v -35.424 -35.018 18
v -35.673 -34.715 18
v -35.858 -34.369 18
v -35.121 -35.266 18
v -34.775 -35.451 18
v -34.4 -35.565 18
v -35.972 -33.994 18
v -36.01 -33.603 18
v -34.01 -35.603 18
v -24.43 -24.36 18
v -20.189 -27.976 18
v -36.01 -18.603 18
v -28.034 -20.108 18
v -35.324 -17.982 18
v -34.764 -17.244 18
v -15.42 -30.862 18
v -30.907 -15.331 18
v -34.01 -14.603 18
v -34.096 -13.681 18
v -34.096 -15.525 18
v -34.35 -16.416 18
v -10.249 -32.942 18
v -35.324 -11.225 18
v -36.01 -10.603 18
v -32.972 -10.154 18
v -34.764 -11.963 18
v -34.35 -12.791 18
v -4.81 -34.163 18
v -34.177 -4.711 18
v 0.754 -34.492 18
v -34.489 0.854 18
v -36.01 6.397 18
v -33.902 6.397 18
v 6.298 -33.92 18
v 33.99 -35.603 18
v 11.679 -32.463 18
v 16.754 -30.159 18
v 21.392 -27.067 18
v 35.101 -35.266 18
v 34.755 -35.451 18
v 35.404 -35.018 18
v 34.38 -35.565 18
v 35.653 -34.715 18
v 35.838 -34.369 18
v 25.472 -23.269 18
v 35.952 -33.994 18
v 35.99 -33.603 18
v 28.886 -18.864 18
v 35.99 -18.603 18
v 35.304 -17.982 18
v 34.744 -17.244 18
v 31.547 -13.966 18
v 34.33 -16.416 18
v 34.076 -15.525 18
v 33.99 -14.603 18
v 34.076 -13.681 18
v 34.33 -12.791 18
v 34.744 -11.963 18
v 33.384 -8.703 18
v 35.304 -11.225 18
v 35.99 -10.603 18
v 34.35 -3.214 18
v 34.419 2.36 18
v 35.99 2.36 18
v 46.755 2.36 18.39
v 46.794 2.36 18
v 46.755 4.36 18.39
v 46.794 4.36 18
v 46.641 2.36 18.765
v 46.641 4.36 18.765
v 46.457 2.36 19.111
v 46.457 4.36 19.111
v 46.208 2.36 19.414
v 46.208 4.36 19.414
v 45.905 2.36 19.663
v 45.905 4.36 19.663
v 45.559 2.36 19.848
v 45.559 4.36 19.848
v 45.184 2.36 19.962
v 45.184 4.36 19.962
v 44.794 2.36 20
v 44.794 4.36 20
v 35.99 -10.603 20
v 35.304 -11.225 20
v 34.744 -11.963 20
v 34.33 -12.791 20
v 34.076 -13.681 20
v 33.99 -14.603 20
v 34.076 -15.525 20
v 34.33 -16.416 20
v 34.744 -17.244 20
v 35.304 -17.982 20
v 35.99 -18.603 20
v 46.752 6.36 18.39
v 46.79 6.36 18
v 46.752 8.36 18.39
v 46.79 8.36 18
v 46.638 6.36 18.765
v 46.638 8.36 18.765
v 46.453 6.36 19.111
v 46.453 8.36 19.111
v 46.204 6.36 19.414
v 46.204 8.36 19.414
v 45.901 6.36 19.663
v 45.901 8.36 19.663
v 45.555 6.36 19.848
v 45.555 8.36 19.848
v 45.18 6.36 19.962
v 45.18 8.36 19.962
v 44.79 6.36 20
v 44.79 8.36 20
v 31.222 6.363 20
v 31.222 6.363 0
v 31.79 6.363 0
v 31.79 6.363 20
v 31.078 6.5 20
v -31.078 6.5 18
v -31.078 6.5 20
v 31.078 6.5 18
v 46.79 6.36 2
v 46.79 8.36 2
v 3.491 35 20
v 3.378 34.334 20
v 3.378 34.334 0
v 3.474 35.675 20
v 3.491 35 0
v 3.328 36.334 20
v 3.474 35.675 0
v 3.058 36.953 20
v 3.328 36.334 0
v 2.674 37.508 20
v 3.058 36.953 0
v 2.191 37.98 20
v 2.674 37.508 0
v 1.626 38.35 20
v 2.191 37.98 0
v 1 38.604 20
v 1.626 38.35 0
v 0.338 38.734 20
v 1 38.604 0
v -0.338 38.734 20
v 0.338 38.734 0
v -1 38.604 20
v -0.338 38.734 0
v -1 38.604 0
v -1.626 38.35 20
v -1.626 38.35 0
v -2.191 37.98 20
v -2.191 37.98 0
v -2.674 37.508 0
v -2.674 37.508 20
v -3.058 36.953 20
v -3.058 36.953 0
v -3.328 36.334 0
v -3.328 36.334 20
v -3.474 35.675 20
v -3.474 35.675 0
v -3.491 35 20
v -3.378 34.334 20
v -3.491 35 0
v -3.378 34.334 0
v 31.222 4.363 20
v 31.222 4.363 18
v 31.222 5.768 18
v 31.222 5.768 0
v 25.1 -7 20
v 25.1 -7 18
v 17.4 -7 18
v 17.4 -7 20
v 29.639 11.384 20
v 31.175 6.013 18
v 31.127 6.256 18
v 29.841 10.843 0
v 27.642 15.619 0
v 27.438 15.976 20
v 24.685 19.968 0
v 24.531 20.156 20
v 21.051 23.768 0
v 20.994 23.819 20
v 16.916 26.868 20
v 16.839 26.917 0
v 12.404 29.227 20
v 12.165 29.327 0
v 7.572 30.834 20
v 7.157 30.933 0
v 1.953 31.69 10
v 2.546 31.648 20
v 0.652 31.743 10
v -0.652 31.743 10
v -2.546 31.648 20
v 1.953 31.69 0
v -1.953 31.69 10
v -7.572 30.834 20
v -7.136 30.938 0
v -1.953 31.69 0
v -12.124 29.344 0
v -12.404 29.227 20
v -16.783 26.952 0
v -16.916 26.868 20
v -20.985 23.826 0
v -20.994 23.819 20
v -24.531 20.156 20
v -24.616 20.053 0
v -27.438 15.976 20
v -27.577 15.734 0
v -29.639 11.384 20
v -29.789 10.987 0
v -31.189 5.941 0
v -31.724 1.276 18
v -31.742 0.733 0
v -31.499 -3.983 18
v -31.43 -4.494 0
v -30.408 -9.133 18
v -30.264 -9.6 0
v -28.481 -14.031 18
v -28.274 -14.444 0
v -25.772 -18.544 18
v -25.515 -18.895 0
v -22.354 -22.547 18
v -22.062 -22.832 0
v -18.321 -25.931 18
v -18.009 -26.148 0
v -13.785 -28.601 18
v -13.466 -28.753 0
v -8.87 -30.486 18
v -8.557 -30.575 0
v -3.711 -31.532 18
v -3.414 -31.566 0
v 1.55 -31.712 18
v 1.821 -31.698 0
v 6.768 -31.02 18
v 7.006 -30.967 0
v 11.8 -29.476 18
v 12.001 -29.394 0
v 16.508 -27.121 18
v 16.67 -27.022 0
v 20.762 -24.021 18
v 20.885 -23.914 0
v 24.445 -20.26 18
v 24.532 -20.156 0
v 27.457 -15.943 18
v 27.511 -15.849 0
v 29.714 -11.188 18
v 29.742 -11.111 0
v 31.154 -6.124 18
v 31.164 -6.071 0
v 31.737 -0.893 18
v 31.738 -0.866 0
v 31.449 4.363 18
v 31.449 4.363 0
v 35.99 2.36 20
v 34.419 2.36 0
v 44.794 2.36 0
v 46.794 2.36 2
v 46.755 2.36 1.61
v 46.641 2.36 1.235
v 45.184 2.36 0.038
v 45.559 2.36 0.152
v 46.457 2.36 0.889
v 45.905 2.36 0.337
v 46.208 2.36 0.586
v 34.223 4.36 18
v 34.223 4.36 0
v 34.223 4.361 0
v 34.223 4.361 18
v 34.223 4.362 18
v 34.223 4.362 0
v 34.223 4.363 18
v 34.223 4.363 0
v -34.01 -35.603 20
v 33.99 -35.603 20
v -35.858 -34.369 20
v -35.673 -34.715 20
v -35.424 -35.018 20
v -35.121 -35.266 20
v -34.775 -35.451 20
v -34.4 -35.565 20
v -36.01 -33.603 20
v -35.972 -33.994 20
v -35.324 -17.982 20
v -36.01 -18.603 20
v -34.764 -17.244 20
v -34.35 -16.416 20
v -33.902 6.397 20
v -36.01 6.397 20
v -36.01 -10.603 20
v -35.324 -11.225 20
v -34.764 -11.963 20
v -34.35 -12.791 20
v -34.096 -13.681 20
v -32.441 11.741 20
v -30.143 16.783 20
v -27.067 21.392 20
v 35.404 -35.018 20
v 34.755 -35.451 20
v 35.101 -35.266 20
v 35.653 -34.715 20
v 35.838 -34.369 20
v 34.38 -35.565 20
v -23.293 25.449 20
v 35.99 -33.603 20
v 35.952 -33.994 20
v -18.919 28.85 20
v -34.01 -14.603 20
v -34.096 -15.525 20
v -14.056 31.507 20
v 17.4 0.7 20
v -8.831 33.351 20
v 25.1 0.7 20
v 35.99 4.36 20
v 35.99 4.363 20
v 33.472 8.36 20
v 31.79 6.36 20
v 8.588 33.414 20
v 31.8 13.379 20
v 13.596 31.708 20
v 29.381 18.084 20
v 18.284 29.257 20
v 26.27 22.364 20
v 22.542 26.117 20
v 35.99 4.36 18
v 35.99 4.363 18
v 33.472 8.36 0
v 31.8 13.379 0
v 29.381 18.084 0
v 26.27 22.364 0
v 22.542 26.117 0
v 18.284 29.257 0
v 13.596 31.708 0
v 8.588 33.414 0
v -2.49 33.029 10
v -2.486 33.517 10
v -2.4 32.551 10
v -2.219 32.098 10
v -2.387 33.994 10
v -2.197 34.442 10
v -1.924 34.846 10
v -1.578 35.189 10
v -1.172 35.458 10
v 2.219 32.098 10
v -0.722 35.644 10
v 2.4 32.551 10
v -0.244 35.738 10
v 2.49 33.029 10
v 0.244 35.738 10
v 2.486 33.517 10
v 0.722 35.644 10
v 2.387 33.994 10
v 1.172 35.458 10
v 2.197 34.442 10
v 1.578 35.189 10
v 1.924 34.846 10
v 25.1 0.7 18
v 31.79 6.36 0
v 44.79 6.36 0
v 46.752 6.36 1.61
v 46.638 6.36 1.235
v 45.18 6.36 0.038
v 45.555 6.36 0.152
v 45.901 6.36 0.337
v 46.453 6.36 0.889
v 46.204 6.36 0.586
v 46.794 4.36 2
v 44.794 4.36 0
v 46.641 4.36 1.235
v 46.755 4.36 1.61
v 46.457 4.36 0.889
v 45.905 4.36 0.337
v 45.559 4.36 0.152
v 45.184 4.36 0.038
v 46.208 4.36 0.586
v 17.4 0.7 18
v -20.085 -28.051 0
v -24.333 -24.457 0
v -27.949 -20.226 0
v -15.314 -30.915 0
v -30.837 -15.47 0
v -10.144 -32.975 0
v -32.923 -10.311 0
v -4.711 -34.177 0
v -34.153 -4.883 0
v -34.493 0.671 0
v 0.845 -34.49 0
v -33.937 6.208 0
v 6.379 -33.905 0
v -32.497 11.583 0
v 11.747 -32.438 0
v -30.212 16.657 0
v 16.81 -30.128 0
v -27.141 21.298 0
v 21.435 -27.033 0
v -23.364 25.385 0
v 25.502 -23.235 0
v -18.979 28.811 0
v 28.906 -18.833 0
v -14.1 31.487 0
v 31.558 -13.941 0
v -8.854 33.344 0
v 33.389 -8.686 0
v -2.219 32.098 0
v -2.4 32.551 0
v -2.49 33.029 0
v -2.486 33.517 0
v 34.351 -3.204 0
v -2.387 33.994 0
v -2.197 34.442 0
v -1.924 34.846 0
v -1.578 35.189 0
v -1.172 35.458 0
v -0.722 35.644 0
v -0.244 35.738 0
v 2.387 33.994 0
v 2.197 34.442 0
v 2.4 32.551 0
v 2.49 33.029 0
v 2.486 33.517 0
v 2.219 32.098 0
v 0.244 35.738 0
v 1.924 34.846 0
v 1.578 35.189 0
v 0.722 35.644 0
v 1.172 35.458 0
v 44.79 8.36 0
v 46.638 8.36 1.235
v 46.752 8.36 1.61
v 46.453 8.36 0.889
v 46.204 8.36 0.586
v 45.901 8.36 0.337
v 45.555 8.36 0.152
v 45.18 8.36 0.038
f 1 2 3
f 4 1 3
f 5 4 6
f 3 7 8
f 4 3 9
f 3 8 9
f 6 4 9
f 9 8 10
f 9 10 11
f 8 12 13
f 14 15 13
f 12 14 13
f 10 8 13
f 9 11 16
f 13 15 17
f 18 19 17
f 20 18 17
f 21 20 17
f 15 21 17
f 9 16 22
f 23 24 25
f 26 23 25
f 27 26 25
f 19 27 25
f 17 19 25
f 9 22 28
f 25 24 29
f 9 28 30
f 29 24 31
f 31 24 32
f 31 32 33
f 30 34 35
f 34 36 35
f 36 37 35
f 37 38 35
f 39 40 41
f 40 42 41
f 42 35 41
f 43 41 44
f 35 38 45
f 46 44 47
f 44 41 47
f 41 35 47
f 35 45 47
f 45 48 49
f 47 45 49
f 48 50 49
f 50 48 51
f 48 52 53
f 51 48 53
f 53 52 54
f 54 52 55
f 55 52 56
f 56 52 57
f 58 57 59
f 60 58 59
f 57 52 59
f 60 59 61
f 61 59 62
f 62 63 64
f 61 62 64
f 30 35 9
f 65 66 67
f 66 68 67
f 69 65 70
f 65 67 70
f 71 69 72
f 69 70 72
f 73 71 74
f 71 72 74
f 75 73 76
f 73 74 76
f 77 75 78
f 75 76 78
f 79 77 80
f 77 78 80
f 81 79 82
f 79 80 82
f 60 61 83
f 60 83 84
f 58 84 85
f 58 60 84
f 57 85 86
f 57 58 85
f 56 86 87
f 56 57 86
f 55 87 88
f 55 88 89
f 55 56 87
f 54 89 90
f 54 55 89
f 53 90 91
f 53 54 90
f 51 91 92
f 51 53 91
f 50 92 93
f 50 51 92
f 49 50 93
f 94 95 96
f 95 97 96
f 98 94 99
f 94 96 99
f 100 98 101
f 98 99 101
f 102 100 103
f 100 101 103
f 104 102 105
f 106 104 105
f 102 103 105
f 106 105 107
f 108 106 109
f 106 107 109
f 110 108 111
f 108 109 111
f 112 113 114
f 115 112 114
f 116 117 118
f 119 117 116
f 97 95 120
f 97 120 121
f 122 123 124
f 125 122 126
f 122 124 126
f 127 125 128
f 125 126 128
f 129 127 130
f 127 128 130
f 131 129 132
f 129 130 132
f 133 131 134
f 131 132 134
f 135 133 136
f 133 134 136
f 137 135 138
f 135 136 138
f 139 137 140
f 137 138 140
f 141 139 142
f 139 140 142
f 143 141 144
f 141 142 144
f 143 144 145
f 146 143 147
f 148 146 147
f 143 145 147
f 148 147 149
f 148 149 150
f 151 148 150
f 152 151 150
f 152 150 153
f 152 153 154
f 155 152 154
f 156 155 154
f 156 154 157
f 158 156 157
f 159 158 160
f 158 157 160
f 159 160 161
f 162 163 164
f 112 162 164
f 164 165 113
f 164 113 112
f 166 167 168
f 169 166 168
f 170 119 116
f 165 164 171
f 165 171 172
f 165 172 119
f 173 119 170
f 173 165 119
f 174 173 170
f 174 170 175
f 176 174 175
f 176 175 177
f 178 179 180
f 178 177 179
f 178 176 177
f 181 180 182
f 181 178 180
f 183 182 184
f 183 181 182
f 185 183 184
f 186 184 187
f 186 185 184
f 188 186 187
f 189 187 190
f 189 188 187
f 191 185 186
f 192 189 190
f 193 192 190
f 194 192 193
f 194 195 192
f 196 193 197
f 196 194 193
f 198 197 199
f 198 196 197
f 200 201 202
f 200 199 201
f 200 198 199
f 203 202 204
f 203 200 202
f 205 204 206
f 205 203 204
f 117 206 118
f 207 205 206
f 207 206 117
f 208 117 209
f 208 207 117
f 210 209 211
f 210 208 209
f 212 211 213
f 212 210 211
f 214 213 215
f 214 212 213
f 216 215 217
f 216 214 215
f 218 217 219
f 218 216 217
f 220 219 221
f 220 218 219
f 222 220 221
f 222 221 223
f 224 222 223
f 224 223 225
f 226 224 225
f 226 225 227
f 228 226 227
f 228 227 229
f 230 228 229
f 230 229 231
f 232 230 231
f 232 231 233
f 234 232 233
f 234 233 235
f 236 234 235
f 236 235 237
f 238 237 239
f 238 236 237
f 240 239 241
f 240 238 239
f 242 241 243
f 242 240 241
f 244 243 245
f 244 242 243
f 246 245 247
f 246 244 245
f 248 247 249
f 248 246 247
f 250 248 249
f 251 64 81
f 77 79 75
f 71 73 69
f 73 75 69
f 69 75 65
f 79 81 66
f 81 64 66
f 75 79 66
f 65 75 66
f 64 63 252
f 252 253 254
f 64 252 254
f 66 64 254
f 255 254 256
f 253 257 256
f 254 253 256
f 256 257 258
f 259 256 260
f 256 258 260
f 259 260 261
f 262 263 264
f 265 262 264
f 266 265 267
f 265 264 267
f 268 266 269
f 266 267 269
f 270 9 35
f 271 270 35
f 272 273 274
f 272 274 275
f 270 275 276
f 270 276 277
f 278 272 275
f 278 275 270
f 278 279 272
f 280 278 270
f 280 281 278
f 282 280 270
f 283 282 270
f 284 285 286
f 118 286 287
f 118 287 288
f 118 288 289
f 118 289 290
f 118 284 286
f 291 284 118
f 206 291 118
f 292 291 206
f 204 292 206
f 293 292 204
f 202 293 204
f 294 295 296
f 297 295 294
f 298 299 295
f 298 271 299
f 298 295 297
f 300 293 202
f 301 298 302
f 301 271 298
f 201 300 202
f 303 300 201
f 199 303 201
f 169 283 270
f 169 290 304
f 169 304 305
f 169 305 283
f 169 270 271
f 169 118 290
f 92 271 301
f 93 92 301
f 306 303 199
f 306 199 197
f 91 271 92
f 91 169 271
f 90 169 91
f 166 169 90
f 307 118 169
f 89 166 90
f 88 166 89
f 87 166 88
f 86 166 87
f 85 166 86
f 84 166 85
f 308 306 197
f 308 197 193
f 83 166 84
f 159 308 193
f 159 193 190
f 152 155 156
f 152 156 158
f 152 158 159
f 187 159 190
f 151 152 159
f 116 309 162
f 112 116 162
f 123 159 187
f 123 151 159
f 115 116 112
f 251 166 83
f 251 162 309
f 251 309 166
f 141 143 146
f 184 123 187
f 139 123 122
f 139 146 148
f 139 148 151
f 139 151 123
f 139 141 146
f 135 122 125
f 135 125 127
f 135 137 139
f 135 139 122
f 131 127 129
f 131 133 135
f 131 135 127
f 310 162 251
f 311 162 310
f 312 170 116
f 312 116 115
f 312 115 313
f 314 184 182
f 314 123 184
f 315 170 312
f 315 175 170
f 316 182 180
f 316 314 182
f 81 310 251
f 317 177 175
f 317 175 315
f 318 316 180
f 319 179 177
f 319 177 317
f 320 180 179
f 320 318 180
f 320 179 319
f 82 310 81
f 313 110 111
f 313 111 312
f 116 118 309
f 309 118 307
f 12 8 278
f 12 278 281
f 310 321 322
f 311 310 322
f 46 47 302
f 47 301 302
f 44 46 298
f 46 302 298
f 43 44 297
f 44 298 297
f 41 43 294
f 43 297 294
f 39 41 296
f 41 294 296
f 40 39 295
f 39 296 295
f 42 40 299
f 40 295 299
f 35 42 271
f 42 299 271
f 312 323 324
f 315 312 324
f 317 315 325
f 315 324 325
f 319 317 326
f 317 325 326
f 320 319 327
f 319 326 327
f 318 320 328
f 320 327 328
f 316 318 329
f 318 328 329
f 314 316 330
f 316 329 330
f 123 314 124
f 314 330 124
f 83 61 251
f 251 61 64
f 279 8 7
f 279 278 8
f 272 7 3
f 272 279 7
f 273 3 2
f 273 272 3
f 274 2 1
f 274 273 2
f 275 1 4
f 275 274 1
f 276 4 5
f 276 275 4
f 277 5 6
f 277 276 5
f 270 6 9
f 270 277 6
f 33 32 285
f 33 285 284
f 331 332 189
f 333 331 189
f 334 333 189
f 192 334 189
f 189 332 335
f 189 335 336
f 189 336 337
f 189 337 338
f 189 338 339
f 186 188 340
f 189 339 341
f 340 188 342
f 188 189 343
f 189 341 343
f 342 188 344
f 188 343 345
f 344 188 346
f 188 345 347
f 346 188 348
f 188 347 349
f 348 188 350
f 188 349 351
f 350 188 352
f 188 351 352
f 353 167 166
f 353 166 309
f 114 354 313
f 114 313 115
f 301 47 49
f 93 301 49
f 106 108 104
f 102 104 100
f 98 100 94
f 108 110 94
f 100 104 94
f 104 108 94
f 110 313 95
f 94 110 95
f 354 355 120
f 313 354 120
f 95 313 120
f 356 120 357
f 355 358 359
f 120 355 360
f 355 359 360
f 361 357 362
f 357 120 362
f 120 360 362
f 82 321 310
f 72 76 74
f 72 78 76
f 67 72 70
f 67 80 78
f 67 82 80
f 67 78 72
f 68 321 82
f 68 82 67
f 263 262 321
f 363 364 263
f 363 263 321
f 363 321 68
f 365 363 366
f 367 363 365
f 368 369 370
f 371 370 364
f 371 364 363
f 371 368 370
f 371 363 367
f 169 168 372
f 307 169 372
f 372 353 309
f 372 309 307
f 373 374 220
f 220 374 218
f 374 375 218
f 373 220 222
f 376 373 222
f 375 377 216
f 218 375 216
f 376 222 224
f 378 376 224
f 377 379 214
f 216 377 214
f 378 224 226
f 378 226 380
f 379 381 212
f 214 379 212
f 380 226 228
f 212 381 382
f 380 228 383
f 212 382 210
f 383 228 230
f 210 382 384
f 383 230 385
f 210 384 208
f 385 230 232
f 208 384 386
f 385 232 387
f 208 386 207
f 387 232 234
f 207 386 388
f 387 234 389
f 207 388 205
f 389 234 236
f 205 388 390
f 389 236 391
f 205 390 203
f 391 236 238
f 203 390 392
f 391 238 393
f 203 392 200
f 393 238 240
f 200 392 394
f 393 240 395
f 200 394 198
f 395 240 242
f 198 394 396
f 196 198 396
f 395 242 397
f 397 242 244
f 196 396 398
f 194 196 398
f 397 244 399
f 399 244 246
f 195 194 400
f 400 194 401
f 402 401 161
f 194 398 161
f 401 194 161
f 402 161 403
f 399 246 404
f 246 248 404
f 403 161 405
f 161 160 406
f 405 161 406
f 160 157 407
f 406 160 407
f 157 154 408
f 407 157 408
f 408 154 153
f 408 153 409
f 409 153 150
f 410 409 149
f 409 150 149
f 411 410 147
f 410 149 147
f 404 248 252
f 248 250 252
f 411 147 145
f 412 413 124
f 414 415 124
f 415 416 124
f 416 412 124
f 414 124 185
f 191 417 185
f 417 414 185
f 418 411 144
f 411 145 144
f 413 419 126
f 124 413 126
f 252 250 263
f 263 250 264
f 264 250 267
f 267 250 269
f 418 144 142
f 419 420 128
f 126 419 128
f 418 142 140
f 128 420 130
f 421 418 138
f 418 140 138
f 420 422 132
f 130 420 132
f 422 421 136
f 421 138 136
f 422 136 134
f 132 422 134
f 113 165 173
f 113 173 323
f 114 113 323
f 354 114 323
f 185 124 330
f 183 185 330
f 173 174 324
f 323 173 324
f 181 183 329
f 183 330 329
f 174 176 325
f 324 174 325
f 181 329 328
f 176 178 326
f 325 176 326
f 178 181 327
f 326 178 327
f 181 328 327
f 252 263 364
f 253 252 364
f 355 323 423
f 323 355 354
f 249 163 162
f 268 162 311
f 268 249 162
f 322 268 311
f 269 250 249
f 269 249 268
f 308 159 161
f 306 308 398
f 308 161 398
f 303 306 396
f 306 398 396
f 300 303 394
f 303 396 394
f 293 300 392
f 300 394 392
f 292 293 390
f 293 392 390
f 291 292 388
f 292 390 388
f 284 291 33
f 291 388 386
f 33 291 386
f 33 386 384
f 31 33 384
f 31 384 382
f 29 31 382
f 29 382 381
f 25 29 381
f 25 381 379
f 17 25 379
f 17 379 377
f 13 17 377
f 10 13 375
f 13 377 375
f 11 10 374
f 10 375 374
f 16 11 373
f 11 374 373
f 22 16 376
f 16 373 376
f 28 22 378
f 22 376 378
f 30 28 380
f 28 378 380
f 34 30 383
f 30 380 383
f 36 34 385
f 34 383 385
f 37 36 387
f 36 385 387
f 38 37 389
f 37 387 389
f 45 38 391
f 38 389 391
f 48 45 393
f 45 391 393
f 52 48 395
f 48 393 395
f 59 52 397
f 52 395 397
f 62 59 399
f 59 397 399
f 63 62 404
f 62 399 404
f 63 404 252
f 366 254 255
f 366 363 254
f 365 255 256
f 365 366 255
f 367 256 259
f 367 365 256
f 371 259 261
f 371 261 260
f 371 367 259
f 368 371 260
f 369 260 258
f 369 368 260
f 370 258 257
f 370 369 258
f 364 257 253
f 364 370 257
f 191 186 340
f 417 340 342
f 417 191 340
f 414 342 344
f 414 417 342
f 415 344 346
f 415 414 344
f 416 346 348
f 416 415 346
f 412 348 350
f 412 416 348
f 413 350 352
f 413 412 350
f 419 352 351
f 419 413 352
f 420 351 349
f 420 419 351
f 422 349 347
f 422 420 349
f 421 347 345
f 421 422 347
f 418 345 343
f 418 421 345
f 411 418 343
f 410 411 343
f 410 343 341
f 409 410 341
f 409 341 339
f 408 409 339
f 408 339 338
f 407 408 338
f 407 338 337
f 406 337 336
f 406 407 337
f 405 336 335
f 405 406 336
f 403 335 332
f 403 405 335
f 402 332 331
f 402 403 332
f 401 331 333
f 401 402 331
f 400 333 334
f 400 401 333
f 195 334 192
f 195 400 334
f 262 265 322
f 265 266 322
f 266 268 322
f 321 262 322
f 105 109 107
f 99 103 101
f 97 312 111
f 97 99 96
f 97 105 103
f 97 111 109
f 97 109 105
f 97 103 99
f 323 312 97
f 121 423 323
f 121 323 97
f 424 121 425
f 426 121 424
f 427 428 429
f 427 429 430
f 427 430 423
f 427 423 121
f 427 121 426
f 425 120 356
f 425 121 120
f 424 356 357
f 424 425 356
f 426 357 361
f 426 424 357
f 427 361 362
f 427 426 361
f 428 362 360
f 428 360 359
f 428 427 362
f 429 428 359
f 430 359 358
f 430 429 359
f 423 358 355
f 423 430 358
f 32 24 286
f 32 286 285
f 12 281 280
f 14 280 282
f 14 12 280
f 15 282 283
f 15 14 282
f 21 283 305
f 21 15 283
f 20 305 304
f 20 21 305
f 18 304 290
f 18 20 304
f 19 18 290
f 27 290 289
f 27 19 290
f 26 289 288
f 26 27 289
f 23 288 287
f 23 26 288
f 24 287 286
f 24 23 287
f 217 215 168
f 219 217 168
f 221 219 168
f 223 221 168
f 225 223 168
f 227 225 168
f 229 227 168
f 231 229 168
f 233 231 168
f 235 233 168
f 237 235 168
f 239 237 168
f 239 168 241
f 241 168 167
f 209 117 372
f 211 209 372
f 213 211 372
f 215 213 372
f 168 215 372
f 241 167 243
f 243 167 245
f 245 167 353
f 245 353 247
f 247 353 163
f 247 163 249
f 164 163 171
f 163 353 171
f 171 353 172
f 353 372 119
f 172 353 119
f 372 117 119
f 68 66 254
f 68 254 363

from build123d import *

# Parameters (mm, degrees)
CYLINDER027_R     = 2.5
CYLINDER027_DEPTH = 10
CYLINDER020_R     = 5
CYLINDER020_DEPTH = 5
CYLINDER019_R     = 5
CYLINDER019_DEPTH = 5
BOX005_W          = 15
BOX005_H          = 2
BOX005_DEPTH      = 20
FILLET002_R       = 2
BOX002_W          = 10
BOX002_H          = 2
BOX002_DEPTH      = 20
BOX_W             = 80
BOX_H             = 39
BOX_DEPTH         = 25
CYLINDER002_R     = 31.75
CYLINDER002_DEPTH = 25
BOX001_W          = 7.7
BOX001_H          = 7.7
BOX001_DEPTH      = 10
BOX007_W          = 72
BOX007_H          = 42
BOX007_DEPTH      = 2
CYLINDER_R        = 31.75
CYLINDER_DEPTH    = 18
CYLINDER001_R     = 34.5
CYLINDER001_DEPTH = 20
FILLET001_R       = 2
BOX006_W          = 15
BOX006_H          = 2
BOX006_DEPTH      = 20
FILLET003_R       = 2
CYLINDER026_R     = 3.5
CYLINDER026_DEPTH = 20


with BuildPart() as cylinder027:
    # Cylinder027 → Cylinder027 (new body)
    with BuildSketch(Plane(origin=(0, 33.25, 0), x_dir=(1, 0, 0), z_dir=(0, 0, 1))):
        Circle(CYLINDER027_R)
    extrude(amount=CYLINDER027_DEPTH)


with BuildPart() as cylinder020:
    # Cylinder020 → Cylinder020 (new body)
    with BuildSketch(Plane(origin=(-39.01, -14.6034, 15), x_dir=(1, 0, 0), z_dir=(0, 0, 1))):
        Circle(CYLINDER020_R)
    extrude(amount=CYLINDER020_DEPTH)


with BuildPart() as fusion013:
    # Cylinder019 → Cylinder019 (new body)
    with BuildSketch(Plane(origin=(38.99, -14.6034, 15), x_dir=(1, 0, 0), z_dir=(0, 0, 1))):
        Circle(CYLINDER019_R)
    extrude(amount=CYLINDER019_DEPTH)

    # Fusion013: union Cylinder020
    add(cylinder020.part)


with BuildPart() as fillet002:
    # Box005 → Box005 (new body)
    with BuildSketch(Plane(origin=(31.79, 6.35995, 0), x_dir=(1, 0, 0), z_dir=(0, 0, 1))):
        with Locations((7.5, 1)):
            Rectangle(BOX005_W, BOX005_H)
    extrude(amount=BOX005_DEPTH)

    # Fillet002
    fillet002_edges = [fillet002.edges().sort_by_distance(p)[0] for p in [
        (46.79, 7.35995, 20),
        (46.79, 7.35995, 0),
    ]]
    fillet(fillet002_edges, radius=FILLET002_R)


with BuildPart() as kostka002:
    # Box002 → Box002 (new body)
    with BuildSketch(Plane(origin=(31.22162, 4.362905, 0), x_dir=(1, 0, 0), z_dir=(0, 0, 1))):
        with Locations((5, 1)):
            Rectangle(BOX002_W, BOX002_H)
    extrude(amount=BOX002_DEPTH)


with BuildPart() as kostka:
    # Box → Box (new body)
    with BuildSketch(Plane(origin=(-38, -32.5, 0), x_dir=(1, 0, 0), z_dir=(0, 0, 1))):
        with Locations((40, 19.5)):
            Rectangle(BOX_W, BOX_H)
    extrude(amount=BOX_DEPTH)


with BuildPart() as cut001:
    # Cylinder002 → Cylinder002 (new body)
    with BuildSketch(Plane.XY):
        Circle(CYLINDER002_R)
    extrude(amount=CYLINDER002_DEPTH)

    # Cut001: cut Kostka
    add(kostka.part, mode=Mode.SUBTRACT)


with BuildPart() as kostka001:
    # Box001 → Box001 (new body)
    with BuildSketch(Plane(origin=(25.1, -7, 10), x_dir=(0, 1, 0), z_dir=(0, 0, 1))):
        with Locations((3.85, 3.85)):
            Rectangle(BOX001_W, BOX001_H)
    extrude(amount=BOX001_DEPTH)


with BuildPart() as kostka007:
    # Box007 → Box007 (new body)
    with BuildSketch(Plane(origin=(-36.01, -35.6034, 18), x_dir=(1, 0, 0), z_dir=(0, 0, 1))):
        with Locations((36, 21)):
            Rectangle(BOX007_W, BOX007_H)
    extrude(amount=BOX007_DEPTH)


with BuildPart() as cylinder:
    # Cylinder → Cylinder (new body)
    with BuildSketch(Plane.XY):
        Circle(CYLINDER_R)
    extrude(amount=CYLINDER_DEPTH)


with BuildPart() as fusion001:
    # Cylinder001 → Cylinder001 (new body)
    with BuildSketch(Plane.XY):
        Circle(CYLINDER001_R)
    extrude(amount=CYLINDER001_DEPTH)

    # Cut: cut Cylinder
    add(cylinder.part, mode=Mode.SUBTRACT)

    # Fusion: union Kostka007
    add(kostka007.part)

    # Cut002: cut Kostka001
    add(kostka001.part, mode=Mode.SUBTRACT)

    # Cut003: cut Cut001
    add(cut001.part, mode=Mode.SUBTRACT)

    # Cut004: cut Kostka002
    add(kostka002.part, mode=Mode.SUBTRACT)

    # Fillet001
    fillet001_edges = [fusion001.edges().sort_by_distance(p)[0] for p in [
        (-36.01, -35.6034, 19),
        (35.99, -35.6034, 19),
    ]]
    fillet(fillet001_edges, radius=FILLET001_R)

    # Fusion001: union Fillet002
    add(fillet002.part)


with BuildPart() as cut015:
    # Box006 → Box006 (new body)
    with BuildSketch(Plane(origin=(31.7936, 2.359946, 0), x_dir=(1, 0, 0), z_dir=(0, 0, 1))):
        with Locations((7.5, 1)):
            Rectangle(BOX006_W, BOX006_H)
    extrude(amount=BOX006_DEPTH)

    # Fillet003
    fillet003_edges = [cut015.edges().sort_by_distance(p)[0] for p in [
        (46.7936, 3.359946, 20),
        (46.7936, 3.359946, 0),
    ]]
    fillet(fillet003_edges, radius=FILLET003_R)

    # Fusion002: union Fusion001
    add(fusion001.part)

    # Cut015: cut Fusion013
    add(fusion013.part, mode=Mode.SUBTRACT)


with BuildPart() as base:
    # Cylinder026 → Cylinder026 (new body)
    with BuildSketch(Plane(origin=(0, 35.25, 0), x_dir=(1, 0, 0), z_dir=(0, 0, 1))):
        Circle(CYLINDER026_R)
    extrude(amount=CYLINDER026_DEPTH)

    # Fusion019: union Cut015
    add(cut015.part)

    # Cut023: cut Cylinder027
    add(cylinder027.part, mode=Mode.SUBTRACT)


solid = base.part
